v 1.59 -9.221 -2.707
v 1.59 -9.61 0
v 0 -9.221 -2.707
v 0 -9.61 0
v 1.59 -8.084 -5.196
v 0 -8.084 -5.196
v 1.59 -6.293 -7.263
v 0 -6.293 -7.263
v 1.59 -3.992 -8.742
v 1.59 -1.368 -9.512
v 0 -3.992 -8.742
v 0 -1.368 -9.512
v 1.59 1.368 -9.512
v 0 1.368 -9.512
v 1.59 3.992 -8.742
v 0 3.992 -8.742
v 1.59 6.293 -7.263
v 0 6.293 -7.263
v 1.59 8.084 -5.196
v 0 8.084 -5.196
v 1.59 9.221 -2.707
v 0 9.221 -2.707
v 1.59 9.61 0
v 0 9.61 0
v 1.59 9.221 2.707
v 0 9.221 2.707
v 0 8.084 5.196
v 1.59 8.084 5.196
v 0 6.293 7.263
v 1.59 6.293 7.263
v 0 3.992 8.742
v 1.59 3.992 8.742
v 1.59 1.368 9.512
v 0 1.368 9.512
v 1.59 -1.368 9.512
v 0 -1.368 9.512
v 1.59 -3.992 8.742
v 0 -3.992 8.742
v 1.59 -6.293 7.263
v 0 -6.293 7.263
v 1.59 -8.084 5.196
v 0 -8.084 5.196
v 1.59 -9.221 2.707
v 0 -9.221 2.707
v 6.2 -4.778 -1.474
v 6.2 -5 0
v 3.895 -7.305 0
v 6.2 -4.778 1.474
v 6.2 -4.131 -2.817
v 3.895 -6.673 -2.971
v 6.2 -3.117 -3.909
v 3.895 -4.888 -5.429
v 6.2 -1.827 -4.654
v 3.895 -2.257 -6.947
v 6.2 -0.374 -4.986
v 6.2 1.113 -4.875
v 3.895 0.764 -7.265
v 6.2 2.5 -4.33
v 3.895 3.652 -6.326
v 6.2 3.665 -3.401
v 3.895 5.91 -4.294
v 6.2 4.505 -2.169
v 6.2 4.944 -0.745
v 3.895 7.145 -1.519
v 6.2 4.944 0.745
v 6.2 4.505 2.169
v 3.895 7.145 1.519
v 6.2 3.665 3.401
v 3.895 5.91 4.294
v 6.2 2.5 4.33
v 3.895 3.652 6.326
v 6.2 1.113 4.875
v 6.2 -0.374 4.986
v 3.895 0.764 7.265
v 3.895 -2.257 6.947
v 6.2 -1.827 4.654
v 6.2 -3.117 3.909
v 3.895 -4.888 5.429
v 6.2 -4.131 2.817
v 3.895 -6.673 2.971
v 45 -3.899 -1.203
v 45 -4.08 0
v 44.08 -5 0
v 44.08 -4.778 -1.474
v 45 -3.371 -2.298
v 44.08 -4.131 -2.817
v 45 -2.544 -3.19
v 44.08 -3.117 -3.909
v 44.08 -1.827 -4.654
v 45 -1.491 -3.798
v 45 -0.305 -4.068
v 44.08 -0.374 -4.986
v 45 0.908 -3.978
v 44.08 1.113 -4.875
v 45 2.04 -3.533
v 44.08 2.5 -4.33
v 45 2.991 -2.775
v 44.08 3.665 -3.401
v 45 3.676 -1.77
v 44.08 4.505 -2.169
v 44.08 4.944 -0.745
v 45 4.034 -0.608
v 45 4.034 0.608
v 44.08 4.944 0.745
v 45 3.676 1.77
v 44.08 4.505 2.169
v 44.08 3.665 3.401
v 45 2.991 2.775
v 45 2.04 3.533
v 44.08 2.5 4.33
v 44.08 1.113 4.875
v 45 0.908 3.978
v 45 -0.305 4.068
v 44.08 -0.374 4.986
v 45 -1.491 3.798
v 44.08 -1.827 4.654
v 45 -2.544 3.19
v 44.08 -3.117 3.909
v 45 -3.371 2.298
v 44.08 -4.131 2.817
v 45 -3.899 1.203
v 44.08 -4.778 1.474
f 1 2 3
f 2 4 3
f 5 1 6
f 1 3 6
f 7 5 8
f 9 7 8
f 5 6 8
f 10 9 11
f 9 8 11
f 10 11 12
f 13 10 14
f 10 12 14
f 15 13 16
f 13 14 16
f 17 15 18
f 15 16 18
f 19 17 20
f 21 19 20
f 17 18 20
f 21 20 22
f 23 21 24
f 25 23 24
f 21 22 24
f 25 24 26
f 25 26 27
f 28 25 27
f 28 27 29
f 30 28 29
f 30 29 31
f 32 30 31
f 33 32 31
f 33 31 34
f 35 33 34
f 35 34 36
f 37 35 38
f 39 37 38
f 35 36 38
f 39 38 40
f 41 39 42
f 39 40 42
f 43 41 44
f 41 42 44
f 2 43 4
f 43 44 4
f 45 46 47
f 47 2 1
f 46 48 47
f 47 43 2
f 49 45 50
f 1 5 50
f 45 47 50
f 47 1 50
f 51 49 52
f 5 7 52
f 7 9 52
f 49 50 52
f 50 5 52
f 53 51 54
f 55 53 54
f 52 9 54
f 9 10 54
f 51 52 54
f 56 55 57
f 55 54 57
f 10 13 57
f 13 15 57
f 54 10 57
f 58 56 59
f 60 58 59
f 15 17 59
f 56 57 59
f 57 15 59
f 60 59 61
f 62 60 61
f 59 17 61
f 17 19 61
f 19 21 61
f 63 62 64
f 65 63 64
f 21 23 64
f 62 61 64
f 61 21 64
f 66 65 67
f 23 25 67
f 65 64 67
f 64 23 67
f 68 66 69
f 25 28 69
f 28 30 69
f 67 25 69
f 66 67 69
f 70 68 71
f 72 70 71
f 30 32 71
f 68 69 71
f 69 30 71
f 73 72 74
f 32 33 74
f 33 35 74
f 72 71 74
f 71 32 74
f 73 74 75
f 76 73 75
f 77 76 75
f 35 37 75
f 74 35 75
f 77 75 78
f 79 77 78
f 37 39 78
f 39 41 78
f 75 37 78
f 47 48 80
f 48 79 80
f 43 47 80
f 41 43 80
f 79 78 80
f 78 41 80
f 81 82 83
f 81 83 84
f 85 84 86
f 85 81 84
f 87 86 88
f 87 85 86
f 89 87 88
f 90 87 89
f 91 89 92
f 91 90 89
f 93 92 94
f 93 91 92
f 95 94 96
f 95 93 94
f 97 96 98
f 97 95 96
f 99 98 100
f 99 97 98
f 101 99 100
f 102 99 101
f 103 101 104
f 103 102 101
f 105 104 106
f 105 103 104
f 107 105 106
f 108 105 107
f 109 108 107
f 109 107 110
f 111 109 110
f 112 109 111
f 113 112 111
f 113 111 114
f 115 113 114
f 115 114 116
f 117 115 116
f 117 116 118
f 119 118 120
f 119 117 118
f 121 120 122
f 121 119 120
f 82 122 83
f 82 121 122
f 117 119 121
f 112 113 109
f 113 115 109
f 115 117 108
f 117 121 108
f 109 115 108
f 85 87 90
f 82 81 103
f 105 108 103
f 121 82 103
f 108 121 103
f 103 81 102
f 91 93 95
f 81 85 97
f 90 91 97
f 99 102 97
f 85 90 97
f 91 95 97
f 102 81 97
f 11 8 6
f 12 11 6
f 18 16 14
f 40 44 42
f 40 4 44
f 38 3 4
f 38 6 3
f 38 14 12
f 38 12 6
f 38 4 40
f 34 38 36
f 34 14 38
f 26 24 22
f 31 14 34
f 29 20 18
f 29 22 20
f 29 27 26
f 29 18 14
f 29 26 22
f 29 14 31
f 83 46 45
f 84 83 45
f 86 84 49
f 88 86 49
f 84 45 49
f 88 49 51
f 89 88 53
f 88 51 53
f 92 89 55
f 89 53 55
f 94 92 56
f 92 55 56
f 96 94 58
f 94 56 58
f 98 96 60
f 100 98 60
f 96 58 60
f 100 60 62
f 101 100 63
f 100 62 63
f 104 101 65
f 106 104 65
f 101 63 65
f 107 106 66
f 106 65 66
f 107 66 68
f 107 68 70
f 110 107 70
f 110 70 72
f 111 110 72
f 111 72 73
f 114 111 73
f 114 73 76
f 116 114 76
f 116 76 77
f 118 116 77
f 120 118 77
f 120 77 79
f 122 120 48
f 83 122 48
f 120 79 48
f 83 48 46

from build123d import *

# Parameters (mm, degrees)
EXTRUDE_462_REACH = 49.007
CHAMFER_1_SIZE    = 0.920175


with BuildPart() as part:
    # 草圖1 → Revolve 332 (revolve)
    with BuildSketch(Plane.XY, mode=Mode.PRIVATE) as revolve_332_sk:
        Polygon((45, 0), (45, 5), (13, 5), (12.079825, 5), (6.2, 5), (1.59, 9.61), (0, 9.61), (0, 3.464101615), (4.18, 3.464101615), (6.18, 0), align=None)
    revolve(revolve_332_sk.sketch.rotate(Axis((6.18, 0, 0), (1, 0, 0)), 180), axis=Axis((6.18, 0, 0), (1, 0, 0)))

    # 草圖2 → Extrude 462 (add, up to next)
    with BuildSketch(Plane.ZY, mode=Mode.PRIVATE) as extrude_462_sk1:
        with BuildLine():
            ThreePointArc((0, 3.464101615), (-2.449489743, -2.449489743), (3.464101615, 0))
            ThreePointArc((3.464101615, 0), (2.449489743, 2.449489743), (0, 3.464101615))
        make_face()
    extrude_462_tool1 = extrude(extrude_462_sk1.sketch, amount=-EXTRUDE_462_REACH, mode=Mode.PRIVATE) - part.part
    add(extrude_462_tool1.solids().sort_by_distance((0, 0, 0))[0])

    # 倒角1
    chamfer_1_edges = [part.edges().sort_by_distance(p)[0] for p in [
        (45, 5, 0),
    ]]
    chamfer(chamfer_1_edges, length=CHAMFER_1_SIZE)


solid = part.part
